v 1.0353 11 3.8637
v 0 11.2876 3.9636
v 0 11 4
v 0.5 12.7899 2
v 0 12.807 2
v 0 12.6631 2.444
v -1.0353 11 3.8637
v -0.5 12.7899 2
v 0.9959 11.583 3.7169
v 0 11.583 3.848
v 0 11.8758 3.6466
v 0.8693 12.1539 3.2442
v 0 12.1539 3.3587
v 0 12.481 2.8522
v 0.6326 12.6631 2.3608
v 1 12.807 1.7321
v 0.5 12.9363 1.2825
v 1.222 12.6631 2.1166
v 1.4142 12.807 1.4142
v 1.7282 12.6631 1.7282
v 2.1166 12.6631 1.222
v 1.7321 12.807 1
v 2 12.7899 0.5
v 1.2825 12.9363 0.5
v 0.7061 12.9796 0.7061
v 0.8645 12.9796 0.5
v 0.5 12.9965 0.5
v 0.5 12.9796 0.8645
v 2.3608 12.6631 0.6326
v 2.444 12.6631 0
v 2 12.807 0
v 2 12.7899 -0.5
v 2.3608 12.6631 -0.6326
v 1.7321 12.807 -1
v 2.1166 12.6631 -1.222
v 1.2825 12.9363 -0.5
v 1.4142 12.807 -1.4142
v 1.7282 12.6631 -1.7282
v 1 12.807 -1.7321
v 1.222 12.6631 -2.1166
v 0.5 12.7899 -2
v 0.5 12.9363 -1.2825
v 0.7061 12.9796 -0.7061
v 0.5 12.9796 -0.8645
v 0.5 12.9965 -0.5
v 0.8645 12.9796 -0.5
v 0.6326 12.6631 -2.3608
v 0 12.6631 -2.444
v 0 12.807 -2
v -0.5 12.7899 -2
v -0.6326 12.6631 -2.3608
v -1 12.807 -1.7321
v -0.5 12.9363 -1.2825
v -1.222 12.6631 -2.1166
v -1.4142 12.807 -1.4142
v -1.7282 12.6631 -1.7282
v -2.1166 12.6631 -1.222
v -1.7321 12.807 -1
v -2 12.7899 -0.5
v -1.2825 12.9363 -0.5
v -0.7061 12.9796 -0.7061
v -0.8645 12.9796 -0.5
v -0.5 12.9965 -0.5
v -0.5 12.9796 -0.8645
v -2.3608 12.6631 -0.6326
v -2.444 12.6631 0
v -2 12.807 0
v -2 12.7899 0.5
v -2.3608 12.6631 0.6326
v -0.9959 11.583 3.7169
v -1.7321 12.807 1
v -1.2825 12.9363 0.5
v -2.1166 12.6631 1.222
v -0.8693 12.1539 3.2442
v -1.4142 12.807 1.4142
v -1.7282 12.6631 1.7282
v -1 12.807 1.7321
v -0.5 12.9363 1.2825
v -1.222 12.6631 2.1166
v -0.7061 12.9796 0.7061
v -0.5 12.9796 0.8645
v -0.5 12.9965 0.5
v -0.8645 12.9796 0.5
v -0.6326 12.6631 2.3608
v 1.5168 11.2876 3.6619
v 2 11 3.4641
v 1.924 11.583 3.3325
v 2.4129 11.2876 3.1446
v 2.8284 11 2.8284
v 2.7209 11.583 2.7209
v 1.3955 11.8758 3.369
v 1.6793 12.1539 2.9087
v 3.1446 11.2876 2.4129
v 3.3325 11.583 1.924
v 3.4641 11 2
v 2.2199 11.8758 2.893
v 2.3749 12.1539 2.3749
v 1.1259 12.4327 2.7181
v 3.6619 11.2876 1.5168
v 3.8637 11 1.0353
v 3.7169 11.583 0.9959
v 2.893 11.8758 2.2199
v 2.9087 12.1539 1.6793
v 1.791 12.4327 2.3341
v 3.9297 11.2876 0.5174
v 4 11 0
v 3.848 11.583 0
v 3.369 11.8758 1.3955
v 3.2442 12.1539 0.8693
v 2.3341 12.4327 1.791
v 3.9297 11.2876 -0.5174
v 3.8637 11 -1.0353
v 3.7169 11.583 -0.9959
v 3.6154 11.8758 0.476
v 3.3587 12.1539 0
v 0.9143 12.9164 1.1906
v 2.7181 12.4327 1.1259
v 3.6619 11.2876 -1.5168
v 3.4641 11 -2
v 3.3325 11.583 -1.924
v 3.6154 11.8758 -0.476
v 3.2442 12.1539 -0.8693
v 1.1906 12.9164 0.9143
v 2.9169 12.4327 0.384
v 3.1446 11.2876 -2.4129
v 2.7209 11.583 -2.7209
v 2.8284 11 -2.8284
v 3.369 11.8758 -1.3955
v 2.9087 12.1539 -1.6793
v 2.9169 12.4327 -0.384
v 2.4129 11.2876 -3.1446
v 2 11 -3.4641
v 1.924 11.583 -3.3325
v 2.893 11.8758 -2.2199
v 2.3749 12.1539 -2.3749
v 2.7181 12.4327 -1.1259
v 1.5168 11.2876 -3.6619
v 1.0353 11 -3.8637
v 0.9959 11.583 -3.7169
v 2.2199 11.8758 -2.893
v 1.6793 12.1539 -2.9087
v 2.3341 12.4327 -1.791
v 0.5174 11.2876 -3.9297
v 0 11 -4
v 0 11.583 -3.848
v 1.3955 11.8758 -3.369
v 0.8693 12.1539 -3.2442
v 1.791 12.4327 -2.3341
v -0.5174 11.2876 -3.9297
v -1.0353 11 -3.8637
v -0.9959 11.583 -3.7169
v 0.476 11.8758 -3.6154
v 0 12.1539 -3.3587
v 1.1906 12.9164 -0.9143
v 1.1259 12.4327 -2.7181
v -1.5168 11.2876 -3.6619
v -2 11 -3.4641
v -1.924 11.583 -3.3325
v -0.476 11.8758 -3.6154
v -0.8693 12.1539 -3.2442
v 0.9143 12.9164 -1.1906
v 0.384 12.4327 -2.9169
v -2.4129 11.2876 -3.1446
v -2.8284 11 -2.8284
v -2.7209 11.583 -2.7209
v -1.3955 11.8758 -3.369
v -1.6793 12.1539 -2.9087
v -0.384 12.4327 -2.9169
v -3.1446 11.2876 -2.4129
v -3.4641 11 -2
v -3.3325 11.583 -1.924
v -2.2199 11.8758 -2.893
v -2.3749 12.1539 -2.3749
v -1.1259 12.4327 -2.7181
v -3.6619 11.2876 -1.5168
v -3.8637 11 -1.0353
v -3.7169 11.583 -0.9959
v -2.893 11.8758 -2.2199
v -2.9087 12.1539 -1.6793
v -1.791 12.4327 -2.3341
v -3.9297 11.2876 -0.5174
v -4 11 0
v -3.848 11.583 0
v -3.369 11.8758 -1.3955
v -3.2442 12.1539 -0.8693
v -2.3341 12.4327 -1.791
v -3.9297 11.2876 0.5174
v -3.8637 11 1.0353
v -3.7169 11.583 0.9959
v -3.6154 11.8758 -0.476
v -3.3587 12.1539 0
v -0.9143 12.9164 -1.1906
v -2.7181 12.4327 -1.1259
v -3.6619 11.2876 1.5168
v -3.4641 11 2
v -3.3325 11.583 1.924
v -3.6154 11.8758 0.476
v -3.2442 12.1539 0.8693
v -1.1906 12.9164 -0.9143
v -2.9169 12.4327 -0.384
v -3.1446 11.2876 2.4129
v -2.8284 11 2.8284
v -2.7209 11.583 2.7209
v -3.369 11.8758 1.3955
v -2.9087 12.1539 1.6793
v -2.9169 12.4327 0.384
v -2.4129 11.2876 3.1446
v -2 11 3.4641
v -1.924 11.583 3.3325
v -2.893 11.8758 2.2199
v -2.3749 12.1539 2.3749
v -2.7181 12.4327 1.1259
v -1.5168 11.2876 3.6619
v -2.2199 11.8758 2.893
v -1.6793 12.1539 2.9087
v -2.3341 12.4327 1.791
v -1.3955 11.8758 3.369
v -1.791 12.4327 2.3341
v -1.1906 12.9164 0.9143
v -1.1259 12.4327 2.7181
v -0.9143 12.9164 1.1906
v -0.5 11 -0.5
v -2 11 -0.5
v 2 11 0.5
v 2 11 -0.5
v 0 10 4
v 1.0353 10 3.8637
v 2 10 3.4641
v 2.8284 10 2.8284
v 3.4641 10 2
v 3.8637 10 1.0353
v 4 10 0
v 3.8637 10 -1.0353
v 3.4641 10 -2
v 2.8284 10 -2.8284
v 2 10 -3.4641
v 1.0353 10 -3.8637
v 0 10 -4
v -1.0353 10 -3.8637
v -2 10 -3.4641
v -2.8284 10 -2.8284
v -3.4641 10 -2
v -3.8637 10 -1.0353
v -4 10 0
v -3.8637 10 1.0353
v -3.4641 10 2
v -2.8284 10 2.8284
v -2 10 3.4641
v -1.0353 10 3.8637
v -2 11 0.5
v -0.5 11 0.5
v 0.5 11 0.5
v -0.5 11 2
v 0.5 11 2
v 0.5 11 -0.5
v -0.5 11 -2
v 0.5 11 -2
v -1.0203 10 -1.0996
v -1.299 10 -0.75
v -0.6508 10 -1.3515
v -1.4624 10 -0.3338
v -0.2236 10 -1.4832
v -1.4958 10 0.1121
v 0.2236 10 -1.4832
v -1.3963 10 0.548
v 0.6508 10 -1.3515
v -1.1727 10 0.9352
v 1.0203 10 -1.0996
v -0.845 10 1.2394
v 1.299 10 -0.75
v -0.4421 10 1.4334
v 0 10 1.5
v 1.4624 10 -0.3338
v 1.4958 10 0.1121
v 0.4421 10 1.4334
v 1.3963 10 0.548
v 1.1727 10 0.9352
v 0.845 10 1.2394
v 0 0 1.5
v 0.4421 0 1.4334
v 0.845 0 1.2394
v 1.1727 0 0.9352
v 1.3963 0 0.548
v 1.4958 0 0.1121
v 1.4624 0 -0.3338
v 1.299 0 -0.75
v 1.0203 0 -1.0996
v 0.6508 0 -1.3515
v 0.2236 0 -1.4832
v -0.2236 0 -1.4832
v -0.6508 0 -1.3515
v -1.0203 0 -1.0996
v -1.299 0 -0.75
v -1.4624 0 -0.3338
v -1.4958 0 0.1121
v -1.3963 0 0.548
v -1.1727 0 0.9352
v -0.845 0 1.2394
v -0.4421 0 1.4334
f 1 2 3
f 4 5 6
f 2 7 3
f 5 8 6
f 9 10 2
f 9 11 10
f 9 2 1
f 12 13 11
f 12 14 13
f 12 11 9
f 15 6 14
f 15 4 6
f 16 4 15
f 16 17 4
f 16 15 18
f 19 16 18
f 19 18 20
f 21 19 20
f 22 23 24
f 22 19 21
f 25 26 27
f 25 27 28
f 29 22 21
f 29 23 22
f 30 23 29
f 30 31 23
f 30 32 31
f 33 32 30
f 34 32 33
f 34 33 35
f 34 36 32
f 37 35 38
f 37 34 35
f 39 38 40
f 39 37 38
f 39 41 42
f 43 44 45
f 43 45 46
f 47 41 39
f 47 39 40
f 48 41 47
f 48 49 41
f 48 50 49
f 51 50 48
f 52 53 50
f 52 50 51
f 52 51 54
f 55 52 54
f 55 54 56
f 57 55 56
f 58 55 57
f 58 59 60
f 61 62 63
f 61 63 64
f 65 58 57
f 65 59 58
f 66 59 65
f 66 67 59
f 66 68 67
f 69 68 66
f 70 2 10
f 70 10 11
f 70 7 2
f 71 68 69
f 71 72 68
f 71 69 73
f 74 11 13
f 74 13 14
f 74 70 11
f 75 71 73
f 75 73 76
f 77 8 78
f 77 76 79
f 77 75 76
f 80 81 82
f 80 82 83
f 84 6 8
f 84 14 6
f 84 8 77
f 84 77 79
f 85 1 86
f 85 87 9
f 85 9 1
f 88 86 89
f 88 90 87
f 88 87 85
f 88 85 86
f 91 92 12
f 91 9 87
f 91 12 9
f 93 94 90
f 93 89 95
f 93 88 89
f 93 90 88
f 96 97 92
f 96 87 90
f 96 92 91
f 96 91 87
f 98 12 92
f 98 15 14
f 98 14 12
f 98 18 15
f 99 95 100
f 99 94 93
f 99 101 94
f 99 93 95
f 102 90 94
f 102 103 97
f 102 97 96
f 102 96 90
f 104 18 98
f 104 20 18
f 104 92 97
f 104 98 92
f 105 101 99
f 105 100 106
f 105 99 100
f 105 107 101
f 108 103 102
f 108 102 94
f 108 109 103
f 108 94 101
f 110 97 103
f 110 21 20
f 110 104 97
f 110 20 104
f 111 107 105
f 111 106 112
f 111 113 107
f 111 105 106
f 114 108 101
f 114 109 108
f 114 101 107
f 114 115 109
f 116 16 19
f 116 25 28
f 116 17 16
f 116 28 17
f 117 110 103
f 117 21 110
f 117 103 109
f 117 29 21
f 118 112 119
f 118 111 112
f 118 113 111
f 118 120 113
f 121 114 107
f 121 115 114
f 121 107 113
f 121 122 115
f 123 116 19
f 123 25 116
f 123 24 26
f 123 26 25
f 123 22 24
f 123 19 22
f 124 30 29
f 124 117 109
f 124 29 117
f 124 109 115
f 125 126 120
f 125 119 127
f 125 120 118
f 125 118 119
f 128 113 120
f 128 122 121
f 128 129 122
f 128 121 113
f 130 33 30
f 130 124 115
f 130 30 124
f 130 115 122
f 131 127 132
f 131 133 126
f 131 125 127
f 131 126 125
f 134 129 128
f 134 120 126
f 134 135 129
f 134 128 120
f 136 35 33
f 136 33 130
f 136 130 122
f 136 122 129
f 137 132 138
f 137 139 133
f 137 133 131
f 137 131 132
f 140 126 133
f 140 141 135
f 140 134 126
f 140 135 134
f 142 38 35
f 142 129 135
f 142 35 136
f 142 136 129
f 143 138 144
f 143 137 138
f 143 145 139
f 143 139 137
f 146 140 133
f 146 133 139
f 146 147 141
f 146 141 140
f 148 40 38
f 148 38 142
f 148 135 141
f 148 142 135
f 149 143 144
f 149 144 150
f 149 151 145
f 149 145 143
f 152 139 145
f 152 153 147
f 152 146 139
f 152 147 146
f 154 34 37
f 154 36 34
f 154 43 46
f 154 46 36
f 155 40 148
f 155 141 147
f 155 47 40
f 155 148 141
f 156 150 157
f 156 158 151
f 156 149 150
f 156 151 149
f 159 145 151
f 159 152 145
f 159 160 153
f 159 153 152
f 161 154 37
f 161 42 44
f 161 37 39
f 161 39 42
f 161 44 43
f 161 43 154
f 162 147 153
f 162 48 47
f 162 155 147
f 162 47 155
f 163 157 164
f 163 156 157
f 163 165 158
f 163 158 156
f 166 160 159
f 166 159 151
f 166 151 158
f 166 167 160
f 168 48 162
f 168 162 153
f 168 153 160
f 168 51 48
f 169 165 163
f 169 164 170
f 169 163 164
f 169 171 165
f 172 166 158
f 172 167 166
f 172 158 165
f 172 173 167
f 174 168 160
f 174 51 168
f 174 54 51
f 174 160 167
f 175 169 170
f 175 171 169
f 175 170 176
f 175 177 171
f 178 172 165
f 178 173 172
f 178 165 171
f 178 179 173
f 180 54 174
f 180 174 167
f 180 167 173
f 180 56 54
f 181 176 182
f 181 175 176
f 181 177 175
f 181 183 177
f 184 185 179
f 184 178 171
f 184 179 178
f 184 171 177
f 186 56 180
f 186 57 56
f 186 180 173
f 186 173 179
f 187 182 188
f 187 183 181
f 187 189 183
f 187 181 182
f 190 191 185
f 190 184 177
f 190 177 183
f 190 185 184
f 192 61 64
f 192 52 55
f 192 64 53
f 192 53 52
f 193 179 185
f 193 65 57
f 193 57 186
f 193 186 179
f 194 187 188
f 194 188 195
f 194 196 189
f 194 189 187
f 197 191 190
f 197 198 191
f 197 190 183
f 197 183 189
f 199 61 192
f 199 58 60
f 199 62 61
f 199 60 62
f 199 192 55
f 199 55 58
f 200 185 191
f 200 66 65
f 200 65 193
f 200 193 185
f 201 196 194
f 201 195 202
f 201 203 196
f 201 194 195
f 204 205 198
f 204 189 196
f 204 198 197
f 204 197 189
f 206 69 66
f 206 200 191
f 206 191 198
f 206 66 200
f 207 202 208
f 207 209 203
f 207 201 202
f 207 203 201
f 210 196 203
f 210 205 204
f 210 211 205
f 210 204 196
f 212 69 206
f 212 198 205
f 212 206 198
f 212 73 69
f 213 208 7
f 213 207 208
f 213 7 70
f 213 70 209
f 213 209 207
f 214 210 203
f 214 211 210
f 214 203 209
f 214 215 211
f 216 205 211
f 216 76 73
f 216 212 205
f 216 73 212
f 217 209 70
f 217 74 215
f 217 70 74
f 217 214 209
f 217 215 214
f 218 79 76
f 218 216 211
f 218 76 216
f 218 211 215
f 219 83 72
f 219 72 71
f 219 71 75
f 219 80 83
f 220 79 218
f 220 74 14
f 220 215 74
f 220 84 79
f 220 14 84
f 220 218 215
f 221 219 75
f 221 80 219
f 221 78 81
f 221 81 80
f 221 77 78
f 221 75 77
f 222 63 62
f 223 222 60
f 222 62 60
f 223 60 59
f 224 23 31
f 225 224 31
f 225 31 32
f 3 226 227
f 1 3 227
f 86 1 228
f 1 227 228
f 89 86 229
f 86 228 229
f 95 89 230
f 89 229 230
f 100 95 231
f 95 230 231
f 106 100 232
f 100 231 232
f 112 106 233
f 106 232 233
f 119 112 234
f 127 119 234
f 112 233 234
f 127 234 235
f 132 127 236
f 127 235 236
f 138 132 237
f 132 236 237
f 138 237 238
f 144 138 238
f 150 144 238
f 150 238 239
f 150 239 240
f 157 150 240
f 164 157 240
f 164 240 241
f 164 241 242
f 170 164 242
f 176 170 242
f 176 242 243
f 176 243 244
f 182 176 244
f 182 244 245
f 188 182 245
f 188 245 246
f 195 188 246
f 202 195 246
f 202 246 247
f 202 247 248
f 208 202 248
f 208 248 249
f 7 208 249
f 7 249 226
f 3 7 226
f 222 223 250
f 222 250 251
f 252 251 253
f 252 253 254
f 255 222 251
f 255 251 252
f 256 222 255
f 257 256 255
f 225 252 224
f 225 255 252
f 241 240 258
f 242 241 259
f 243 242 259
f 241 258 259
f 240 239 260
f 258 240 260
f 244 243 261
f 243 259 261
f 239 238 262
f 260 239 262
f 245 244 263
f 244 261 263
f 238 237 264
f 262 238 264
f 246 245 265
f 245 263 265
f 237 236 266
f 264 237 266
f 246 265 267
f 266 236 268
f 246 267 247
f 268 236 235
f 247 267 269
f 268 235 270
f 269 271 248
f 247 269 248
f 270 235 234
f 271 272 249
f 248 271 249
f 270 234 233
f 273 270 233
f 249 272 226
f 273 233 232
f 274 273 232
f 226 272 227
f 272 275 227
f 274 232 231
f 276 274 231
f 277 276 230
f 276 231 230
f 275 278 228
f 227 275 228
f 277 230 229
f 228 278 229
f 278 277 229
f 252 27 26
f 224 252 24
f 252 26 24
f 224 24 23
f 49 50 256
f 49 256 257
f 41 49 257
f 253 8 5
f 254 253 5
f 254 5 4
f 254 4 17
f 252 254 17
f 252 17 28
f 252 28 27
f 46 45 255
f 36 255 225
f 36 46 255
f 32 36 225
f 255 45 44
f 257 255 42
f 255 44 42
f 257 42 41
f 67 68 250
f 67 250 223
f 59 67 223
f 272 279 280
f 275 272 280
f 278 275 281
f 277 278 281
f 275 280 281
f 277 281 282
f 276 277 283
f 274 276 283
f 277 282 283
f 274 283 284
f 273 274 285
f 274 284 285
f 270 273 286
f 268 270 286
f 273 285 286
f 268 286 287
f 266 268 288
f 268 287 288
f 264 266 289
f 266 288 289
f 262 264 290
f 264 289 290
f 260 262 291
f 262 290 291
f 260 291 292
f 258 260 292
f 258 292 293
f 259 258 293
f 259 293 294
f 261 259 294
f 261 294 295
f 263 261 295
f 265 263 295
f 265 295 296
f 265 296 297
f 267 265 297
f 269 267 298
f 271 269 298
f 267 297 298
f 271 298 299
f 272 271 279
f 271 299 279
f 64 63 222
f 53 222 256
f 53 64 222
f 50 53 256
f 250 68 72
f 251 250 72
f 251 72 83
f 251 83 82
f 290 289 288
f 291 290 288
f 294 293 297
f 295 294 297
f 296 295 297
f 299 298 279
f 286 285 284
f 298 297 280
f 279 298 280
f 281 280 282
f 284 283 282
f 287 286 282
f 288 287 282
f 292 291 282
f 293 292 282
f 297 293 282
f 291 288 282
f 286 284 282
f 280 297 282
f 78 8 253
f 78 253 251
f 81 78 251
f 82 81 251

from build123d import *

# Parameters (mm, degrees)
SKETCH1_R           = 1.5
BOSS_EXTRUDE1_DEPTH = 10
SKETCH2_R           = 4
BOSS_EXTRUDE2_DEPTH = 3
SKETCH3_W           = 1.5
SKETCH3_H           = 1
SKETCH3_W_2         = 1
SKETCH3_H_2         = 1.5
CUT_EXTRUDE1_DEPTH  = 2
FILLET1_SIZE        = 2
FILLET1_SIZE_2      = 3.5


with BuildPart() as part:
    # Sketch1 → Boss-Extrude1 (new body)
    with BuildSketch(Plane(origin=(0, 0, 0), x_dir=(1, 0, 0), z_dir=(0, 1, 0))):
        with Locations(Location((0, 0, 0), (0, 0, 270))):
            Circle(SKETCH1_R)
    extrude(amount=BOSS_EXTRUDE1_DEPTH)

    # Sketch2 → Boss-Extrude2 (add)
    with BuildSketch(Plane(origin=(0, 10, 0), x_dir=(1, 0, 0), z_dir=(0, 1, 0))):
        with Locations(Location((0, 0, 0), (0, 0, 270))):
            Circle(SKETCH2_R)
    extrude(amount=BOSS_EXTRUDE2_DEPTH)

    # Sketch3 → Cut-Extrude1 (cut)
    with BuildSketch(Plane(origin=(0, 13, 0), x_dir=(1, 0, 0), z_dir=(0, 1, 0))):
        with Locations((-1.25, 0)):
            Rectangle(SKETCH3_W, SKETCH3_H)
        Rectangle(SKETCH3_W_2, SKETCH3_H)
        with Locations((0, 1.25)):
            Rectangle(SKETCH3_W_2, SKETCH3_H_2)
        with Locations((1.25, 0)):
            Rectangle(SKETCH3_W, SKETCH3_H)
        with Locations((0, -1.25)):
            Rectangle(SKETCH3_W_2, SKETCH3_H_2)
    extrude(amount=-CUT_EXTRUDE1_DEPTH, mode=Mode.SUBTRACT)

    # Fillet1
    # an asymmetric fillet: 3.5, 2 mm, written as the material it takes off along each edge
    with BuildSketch(Plane(origin=(0, 13, 0), x_dir=(0, 0, 1), z_dir=(-1, 0, 0))) as fillet1_piece_1:
        with BuildLine():
            Bezier((4, -FILLET1_SIZE), (4, 0), (4 - FILLET1_SIZE_2, 0), weights=[1, 0.707106781, 1])
            Line((4 - FILLET1_SIZE_2, 0), (4, 0))
            Line((4, 0), (4, -FILLET1_SIZE))
        make_face()
    revolve(axis=Axis((0, 13, 0), (0, 1, 0)), mode=Mode.SUBTRACT)


solid = part.part
